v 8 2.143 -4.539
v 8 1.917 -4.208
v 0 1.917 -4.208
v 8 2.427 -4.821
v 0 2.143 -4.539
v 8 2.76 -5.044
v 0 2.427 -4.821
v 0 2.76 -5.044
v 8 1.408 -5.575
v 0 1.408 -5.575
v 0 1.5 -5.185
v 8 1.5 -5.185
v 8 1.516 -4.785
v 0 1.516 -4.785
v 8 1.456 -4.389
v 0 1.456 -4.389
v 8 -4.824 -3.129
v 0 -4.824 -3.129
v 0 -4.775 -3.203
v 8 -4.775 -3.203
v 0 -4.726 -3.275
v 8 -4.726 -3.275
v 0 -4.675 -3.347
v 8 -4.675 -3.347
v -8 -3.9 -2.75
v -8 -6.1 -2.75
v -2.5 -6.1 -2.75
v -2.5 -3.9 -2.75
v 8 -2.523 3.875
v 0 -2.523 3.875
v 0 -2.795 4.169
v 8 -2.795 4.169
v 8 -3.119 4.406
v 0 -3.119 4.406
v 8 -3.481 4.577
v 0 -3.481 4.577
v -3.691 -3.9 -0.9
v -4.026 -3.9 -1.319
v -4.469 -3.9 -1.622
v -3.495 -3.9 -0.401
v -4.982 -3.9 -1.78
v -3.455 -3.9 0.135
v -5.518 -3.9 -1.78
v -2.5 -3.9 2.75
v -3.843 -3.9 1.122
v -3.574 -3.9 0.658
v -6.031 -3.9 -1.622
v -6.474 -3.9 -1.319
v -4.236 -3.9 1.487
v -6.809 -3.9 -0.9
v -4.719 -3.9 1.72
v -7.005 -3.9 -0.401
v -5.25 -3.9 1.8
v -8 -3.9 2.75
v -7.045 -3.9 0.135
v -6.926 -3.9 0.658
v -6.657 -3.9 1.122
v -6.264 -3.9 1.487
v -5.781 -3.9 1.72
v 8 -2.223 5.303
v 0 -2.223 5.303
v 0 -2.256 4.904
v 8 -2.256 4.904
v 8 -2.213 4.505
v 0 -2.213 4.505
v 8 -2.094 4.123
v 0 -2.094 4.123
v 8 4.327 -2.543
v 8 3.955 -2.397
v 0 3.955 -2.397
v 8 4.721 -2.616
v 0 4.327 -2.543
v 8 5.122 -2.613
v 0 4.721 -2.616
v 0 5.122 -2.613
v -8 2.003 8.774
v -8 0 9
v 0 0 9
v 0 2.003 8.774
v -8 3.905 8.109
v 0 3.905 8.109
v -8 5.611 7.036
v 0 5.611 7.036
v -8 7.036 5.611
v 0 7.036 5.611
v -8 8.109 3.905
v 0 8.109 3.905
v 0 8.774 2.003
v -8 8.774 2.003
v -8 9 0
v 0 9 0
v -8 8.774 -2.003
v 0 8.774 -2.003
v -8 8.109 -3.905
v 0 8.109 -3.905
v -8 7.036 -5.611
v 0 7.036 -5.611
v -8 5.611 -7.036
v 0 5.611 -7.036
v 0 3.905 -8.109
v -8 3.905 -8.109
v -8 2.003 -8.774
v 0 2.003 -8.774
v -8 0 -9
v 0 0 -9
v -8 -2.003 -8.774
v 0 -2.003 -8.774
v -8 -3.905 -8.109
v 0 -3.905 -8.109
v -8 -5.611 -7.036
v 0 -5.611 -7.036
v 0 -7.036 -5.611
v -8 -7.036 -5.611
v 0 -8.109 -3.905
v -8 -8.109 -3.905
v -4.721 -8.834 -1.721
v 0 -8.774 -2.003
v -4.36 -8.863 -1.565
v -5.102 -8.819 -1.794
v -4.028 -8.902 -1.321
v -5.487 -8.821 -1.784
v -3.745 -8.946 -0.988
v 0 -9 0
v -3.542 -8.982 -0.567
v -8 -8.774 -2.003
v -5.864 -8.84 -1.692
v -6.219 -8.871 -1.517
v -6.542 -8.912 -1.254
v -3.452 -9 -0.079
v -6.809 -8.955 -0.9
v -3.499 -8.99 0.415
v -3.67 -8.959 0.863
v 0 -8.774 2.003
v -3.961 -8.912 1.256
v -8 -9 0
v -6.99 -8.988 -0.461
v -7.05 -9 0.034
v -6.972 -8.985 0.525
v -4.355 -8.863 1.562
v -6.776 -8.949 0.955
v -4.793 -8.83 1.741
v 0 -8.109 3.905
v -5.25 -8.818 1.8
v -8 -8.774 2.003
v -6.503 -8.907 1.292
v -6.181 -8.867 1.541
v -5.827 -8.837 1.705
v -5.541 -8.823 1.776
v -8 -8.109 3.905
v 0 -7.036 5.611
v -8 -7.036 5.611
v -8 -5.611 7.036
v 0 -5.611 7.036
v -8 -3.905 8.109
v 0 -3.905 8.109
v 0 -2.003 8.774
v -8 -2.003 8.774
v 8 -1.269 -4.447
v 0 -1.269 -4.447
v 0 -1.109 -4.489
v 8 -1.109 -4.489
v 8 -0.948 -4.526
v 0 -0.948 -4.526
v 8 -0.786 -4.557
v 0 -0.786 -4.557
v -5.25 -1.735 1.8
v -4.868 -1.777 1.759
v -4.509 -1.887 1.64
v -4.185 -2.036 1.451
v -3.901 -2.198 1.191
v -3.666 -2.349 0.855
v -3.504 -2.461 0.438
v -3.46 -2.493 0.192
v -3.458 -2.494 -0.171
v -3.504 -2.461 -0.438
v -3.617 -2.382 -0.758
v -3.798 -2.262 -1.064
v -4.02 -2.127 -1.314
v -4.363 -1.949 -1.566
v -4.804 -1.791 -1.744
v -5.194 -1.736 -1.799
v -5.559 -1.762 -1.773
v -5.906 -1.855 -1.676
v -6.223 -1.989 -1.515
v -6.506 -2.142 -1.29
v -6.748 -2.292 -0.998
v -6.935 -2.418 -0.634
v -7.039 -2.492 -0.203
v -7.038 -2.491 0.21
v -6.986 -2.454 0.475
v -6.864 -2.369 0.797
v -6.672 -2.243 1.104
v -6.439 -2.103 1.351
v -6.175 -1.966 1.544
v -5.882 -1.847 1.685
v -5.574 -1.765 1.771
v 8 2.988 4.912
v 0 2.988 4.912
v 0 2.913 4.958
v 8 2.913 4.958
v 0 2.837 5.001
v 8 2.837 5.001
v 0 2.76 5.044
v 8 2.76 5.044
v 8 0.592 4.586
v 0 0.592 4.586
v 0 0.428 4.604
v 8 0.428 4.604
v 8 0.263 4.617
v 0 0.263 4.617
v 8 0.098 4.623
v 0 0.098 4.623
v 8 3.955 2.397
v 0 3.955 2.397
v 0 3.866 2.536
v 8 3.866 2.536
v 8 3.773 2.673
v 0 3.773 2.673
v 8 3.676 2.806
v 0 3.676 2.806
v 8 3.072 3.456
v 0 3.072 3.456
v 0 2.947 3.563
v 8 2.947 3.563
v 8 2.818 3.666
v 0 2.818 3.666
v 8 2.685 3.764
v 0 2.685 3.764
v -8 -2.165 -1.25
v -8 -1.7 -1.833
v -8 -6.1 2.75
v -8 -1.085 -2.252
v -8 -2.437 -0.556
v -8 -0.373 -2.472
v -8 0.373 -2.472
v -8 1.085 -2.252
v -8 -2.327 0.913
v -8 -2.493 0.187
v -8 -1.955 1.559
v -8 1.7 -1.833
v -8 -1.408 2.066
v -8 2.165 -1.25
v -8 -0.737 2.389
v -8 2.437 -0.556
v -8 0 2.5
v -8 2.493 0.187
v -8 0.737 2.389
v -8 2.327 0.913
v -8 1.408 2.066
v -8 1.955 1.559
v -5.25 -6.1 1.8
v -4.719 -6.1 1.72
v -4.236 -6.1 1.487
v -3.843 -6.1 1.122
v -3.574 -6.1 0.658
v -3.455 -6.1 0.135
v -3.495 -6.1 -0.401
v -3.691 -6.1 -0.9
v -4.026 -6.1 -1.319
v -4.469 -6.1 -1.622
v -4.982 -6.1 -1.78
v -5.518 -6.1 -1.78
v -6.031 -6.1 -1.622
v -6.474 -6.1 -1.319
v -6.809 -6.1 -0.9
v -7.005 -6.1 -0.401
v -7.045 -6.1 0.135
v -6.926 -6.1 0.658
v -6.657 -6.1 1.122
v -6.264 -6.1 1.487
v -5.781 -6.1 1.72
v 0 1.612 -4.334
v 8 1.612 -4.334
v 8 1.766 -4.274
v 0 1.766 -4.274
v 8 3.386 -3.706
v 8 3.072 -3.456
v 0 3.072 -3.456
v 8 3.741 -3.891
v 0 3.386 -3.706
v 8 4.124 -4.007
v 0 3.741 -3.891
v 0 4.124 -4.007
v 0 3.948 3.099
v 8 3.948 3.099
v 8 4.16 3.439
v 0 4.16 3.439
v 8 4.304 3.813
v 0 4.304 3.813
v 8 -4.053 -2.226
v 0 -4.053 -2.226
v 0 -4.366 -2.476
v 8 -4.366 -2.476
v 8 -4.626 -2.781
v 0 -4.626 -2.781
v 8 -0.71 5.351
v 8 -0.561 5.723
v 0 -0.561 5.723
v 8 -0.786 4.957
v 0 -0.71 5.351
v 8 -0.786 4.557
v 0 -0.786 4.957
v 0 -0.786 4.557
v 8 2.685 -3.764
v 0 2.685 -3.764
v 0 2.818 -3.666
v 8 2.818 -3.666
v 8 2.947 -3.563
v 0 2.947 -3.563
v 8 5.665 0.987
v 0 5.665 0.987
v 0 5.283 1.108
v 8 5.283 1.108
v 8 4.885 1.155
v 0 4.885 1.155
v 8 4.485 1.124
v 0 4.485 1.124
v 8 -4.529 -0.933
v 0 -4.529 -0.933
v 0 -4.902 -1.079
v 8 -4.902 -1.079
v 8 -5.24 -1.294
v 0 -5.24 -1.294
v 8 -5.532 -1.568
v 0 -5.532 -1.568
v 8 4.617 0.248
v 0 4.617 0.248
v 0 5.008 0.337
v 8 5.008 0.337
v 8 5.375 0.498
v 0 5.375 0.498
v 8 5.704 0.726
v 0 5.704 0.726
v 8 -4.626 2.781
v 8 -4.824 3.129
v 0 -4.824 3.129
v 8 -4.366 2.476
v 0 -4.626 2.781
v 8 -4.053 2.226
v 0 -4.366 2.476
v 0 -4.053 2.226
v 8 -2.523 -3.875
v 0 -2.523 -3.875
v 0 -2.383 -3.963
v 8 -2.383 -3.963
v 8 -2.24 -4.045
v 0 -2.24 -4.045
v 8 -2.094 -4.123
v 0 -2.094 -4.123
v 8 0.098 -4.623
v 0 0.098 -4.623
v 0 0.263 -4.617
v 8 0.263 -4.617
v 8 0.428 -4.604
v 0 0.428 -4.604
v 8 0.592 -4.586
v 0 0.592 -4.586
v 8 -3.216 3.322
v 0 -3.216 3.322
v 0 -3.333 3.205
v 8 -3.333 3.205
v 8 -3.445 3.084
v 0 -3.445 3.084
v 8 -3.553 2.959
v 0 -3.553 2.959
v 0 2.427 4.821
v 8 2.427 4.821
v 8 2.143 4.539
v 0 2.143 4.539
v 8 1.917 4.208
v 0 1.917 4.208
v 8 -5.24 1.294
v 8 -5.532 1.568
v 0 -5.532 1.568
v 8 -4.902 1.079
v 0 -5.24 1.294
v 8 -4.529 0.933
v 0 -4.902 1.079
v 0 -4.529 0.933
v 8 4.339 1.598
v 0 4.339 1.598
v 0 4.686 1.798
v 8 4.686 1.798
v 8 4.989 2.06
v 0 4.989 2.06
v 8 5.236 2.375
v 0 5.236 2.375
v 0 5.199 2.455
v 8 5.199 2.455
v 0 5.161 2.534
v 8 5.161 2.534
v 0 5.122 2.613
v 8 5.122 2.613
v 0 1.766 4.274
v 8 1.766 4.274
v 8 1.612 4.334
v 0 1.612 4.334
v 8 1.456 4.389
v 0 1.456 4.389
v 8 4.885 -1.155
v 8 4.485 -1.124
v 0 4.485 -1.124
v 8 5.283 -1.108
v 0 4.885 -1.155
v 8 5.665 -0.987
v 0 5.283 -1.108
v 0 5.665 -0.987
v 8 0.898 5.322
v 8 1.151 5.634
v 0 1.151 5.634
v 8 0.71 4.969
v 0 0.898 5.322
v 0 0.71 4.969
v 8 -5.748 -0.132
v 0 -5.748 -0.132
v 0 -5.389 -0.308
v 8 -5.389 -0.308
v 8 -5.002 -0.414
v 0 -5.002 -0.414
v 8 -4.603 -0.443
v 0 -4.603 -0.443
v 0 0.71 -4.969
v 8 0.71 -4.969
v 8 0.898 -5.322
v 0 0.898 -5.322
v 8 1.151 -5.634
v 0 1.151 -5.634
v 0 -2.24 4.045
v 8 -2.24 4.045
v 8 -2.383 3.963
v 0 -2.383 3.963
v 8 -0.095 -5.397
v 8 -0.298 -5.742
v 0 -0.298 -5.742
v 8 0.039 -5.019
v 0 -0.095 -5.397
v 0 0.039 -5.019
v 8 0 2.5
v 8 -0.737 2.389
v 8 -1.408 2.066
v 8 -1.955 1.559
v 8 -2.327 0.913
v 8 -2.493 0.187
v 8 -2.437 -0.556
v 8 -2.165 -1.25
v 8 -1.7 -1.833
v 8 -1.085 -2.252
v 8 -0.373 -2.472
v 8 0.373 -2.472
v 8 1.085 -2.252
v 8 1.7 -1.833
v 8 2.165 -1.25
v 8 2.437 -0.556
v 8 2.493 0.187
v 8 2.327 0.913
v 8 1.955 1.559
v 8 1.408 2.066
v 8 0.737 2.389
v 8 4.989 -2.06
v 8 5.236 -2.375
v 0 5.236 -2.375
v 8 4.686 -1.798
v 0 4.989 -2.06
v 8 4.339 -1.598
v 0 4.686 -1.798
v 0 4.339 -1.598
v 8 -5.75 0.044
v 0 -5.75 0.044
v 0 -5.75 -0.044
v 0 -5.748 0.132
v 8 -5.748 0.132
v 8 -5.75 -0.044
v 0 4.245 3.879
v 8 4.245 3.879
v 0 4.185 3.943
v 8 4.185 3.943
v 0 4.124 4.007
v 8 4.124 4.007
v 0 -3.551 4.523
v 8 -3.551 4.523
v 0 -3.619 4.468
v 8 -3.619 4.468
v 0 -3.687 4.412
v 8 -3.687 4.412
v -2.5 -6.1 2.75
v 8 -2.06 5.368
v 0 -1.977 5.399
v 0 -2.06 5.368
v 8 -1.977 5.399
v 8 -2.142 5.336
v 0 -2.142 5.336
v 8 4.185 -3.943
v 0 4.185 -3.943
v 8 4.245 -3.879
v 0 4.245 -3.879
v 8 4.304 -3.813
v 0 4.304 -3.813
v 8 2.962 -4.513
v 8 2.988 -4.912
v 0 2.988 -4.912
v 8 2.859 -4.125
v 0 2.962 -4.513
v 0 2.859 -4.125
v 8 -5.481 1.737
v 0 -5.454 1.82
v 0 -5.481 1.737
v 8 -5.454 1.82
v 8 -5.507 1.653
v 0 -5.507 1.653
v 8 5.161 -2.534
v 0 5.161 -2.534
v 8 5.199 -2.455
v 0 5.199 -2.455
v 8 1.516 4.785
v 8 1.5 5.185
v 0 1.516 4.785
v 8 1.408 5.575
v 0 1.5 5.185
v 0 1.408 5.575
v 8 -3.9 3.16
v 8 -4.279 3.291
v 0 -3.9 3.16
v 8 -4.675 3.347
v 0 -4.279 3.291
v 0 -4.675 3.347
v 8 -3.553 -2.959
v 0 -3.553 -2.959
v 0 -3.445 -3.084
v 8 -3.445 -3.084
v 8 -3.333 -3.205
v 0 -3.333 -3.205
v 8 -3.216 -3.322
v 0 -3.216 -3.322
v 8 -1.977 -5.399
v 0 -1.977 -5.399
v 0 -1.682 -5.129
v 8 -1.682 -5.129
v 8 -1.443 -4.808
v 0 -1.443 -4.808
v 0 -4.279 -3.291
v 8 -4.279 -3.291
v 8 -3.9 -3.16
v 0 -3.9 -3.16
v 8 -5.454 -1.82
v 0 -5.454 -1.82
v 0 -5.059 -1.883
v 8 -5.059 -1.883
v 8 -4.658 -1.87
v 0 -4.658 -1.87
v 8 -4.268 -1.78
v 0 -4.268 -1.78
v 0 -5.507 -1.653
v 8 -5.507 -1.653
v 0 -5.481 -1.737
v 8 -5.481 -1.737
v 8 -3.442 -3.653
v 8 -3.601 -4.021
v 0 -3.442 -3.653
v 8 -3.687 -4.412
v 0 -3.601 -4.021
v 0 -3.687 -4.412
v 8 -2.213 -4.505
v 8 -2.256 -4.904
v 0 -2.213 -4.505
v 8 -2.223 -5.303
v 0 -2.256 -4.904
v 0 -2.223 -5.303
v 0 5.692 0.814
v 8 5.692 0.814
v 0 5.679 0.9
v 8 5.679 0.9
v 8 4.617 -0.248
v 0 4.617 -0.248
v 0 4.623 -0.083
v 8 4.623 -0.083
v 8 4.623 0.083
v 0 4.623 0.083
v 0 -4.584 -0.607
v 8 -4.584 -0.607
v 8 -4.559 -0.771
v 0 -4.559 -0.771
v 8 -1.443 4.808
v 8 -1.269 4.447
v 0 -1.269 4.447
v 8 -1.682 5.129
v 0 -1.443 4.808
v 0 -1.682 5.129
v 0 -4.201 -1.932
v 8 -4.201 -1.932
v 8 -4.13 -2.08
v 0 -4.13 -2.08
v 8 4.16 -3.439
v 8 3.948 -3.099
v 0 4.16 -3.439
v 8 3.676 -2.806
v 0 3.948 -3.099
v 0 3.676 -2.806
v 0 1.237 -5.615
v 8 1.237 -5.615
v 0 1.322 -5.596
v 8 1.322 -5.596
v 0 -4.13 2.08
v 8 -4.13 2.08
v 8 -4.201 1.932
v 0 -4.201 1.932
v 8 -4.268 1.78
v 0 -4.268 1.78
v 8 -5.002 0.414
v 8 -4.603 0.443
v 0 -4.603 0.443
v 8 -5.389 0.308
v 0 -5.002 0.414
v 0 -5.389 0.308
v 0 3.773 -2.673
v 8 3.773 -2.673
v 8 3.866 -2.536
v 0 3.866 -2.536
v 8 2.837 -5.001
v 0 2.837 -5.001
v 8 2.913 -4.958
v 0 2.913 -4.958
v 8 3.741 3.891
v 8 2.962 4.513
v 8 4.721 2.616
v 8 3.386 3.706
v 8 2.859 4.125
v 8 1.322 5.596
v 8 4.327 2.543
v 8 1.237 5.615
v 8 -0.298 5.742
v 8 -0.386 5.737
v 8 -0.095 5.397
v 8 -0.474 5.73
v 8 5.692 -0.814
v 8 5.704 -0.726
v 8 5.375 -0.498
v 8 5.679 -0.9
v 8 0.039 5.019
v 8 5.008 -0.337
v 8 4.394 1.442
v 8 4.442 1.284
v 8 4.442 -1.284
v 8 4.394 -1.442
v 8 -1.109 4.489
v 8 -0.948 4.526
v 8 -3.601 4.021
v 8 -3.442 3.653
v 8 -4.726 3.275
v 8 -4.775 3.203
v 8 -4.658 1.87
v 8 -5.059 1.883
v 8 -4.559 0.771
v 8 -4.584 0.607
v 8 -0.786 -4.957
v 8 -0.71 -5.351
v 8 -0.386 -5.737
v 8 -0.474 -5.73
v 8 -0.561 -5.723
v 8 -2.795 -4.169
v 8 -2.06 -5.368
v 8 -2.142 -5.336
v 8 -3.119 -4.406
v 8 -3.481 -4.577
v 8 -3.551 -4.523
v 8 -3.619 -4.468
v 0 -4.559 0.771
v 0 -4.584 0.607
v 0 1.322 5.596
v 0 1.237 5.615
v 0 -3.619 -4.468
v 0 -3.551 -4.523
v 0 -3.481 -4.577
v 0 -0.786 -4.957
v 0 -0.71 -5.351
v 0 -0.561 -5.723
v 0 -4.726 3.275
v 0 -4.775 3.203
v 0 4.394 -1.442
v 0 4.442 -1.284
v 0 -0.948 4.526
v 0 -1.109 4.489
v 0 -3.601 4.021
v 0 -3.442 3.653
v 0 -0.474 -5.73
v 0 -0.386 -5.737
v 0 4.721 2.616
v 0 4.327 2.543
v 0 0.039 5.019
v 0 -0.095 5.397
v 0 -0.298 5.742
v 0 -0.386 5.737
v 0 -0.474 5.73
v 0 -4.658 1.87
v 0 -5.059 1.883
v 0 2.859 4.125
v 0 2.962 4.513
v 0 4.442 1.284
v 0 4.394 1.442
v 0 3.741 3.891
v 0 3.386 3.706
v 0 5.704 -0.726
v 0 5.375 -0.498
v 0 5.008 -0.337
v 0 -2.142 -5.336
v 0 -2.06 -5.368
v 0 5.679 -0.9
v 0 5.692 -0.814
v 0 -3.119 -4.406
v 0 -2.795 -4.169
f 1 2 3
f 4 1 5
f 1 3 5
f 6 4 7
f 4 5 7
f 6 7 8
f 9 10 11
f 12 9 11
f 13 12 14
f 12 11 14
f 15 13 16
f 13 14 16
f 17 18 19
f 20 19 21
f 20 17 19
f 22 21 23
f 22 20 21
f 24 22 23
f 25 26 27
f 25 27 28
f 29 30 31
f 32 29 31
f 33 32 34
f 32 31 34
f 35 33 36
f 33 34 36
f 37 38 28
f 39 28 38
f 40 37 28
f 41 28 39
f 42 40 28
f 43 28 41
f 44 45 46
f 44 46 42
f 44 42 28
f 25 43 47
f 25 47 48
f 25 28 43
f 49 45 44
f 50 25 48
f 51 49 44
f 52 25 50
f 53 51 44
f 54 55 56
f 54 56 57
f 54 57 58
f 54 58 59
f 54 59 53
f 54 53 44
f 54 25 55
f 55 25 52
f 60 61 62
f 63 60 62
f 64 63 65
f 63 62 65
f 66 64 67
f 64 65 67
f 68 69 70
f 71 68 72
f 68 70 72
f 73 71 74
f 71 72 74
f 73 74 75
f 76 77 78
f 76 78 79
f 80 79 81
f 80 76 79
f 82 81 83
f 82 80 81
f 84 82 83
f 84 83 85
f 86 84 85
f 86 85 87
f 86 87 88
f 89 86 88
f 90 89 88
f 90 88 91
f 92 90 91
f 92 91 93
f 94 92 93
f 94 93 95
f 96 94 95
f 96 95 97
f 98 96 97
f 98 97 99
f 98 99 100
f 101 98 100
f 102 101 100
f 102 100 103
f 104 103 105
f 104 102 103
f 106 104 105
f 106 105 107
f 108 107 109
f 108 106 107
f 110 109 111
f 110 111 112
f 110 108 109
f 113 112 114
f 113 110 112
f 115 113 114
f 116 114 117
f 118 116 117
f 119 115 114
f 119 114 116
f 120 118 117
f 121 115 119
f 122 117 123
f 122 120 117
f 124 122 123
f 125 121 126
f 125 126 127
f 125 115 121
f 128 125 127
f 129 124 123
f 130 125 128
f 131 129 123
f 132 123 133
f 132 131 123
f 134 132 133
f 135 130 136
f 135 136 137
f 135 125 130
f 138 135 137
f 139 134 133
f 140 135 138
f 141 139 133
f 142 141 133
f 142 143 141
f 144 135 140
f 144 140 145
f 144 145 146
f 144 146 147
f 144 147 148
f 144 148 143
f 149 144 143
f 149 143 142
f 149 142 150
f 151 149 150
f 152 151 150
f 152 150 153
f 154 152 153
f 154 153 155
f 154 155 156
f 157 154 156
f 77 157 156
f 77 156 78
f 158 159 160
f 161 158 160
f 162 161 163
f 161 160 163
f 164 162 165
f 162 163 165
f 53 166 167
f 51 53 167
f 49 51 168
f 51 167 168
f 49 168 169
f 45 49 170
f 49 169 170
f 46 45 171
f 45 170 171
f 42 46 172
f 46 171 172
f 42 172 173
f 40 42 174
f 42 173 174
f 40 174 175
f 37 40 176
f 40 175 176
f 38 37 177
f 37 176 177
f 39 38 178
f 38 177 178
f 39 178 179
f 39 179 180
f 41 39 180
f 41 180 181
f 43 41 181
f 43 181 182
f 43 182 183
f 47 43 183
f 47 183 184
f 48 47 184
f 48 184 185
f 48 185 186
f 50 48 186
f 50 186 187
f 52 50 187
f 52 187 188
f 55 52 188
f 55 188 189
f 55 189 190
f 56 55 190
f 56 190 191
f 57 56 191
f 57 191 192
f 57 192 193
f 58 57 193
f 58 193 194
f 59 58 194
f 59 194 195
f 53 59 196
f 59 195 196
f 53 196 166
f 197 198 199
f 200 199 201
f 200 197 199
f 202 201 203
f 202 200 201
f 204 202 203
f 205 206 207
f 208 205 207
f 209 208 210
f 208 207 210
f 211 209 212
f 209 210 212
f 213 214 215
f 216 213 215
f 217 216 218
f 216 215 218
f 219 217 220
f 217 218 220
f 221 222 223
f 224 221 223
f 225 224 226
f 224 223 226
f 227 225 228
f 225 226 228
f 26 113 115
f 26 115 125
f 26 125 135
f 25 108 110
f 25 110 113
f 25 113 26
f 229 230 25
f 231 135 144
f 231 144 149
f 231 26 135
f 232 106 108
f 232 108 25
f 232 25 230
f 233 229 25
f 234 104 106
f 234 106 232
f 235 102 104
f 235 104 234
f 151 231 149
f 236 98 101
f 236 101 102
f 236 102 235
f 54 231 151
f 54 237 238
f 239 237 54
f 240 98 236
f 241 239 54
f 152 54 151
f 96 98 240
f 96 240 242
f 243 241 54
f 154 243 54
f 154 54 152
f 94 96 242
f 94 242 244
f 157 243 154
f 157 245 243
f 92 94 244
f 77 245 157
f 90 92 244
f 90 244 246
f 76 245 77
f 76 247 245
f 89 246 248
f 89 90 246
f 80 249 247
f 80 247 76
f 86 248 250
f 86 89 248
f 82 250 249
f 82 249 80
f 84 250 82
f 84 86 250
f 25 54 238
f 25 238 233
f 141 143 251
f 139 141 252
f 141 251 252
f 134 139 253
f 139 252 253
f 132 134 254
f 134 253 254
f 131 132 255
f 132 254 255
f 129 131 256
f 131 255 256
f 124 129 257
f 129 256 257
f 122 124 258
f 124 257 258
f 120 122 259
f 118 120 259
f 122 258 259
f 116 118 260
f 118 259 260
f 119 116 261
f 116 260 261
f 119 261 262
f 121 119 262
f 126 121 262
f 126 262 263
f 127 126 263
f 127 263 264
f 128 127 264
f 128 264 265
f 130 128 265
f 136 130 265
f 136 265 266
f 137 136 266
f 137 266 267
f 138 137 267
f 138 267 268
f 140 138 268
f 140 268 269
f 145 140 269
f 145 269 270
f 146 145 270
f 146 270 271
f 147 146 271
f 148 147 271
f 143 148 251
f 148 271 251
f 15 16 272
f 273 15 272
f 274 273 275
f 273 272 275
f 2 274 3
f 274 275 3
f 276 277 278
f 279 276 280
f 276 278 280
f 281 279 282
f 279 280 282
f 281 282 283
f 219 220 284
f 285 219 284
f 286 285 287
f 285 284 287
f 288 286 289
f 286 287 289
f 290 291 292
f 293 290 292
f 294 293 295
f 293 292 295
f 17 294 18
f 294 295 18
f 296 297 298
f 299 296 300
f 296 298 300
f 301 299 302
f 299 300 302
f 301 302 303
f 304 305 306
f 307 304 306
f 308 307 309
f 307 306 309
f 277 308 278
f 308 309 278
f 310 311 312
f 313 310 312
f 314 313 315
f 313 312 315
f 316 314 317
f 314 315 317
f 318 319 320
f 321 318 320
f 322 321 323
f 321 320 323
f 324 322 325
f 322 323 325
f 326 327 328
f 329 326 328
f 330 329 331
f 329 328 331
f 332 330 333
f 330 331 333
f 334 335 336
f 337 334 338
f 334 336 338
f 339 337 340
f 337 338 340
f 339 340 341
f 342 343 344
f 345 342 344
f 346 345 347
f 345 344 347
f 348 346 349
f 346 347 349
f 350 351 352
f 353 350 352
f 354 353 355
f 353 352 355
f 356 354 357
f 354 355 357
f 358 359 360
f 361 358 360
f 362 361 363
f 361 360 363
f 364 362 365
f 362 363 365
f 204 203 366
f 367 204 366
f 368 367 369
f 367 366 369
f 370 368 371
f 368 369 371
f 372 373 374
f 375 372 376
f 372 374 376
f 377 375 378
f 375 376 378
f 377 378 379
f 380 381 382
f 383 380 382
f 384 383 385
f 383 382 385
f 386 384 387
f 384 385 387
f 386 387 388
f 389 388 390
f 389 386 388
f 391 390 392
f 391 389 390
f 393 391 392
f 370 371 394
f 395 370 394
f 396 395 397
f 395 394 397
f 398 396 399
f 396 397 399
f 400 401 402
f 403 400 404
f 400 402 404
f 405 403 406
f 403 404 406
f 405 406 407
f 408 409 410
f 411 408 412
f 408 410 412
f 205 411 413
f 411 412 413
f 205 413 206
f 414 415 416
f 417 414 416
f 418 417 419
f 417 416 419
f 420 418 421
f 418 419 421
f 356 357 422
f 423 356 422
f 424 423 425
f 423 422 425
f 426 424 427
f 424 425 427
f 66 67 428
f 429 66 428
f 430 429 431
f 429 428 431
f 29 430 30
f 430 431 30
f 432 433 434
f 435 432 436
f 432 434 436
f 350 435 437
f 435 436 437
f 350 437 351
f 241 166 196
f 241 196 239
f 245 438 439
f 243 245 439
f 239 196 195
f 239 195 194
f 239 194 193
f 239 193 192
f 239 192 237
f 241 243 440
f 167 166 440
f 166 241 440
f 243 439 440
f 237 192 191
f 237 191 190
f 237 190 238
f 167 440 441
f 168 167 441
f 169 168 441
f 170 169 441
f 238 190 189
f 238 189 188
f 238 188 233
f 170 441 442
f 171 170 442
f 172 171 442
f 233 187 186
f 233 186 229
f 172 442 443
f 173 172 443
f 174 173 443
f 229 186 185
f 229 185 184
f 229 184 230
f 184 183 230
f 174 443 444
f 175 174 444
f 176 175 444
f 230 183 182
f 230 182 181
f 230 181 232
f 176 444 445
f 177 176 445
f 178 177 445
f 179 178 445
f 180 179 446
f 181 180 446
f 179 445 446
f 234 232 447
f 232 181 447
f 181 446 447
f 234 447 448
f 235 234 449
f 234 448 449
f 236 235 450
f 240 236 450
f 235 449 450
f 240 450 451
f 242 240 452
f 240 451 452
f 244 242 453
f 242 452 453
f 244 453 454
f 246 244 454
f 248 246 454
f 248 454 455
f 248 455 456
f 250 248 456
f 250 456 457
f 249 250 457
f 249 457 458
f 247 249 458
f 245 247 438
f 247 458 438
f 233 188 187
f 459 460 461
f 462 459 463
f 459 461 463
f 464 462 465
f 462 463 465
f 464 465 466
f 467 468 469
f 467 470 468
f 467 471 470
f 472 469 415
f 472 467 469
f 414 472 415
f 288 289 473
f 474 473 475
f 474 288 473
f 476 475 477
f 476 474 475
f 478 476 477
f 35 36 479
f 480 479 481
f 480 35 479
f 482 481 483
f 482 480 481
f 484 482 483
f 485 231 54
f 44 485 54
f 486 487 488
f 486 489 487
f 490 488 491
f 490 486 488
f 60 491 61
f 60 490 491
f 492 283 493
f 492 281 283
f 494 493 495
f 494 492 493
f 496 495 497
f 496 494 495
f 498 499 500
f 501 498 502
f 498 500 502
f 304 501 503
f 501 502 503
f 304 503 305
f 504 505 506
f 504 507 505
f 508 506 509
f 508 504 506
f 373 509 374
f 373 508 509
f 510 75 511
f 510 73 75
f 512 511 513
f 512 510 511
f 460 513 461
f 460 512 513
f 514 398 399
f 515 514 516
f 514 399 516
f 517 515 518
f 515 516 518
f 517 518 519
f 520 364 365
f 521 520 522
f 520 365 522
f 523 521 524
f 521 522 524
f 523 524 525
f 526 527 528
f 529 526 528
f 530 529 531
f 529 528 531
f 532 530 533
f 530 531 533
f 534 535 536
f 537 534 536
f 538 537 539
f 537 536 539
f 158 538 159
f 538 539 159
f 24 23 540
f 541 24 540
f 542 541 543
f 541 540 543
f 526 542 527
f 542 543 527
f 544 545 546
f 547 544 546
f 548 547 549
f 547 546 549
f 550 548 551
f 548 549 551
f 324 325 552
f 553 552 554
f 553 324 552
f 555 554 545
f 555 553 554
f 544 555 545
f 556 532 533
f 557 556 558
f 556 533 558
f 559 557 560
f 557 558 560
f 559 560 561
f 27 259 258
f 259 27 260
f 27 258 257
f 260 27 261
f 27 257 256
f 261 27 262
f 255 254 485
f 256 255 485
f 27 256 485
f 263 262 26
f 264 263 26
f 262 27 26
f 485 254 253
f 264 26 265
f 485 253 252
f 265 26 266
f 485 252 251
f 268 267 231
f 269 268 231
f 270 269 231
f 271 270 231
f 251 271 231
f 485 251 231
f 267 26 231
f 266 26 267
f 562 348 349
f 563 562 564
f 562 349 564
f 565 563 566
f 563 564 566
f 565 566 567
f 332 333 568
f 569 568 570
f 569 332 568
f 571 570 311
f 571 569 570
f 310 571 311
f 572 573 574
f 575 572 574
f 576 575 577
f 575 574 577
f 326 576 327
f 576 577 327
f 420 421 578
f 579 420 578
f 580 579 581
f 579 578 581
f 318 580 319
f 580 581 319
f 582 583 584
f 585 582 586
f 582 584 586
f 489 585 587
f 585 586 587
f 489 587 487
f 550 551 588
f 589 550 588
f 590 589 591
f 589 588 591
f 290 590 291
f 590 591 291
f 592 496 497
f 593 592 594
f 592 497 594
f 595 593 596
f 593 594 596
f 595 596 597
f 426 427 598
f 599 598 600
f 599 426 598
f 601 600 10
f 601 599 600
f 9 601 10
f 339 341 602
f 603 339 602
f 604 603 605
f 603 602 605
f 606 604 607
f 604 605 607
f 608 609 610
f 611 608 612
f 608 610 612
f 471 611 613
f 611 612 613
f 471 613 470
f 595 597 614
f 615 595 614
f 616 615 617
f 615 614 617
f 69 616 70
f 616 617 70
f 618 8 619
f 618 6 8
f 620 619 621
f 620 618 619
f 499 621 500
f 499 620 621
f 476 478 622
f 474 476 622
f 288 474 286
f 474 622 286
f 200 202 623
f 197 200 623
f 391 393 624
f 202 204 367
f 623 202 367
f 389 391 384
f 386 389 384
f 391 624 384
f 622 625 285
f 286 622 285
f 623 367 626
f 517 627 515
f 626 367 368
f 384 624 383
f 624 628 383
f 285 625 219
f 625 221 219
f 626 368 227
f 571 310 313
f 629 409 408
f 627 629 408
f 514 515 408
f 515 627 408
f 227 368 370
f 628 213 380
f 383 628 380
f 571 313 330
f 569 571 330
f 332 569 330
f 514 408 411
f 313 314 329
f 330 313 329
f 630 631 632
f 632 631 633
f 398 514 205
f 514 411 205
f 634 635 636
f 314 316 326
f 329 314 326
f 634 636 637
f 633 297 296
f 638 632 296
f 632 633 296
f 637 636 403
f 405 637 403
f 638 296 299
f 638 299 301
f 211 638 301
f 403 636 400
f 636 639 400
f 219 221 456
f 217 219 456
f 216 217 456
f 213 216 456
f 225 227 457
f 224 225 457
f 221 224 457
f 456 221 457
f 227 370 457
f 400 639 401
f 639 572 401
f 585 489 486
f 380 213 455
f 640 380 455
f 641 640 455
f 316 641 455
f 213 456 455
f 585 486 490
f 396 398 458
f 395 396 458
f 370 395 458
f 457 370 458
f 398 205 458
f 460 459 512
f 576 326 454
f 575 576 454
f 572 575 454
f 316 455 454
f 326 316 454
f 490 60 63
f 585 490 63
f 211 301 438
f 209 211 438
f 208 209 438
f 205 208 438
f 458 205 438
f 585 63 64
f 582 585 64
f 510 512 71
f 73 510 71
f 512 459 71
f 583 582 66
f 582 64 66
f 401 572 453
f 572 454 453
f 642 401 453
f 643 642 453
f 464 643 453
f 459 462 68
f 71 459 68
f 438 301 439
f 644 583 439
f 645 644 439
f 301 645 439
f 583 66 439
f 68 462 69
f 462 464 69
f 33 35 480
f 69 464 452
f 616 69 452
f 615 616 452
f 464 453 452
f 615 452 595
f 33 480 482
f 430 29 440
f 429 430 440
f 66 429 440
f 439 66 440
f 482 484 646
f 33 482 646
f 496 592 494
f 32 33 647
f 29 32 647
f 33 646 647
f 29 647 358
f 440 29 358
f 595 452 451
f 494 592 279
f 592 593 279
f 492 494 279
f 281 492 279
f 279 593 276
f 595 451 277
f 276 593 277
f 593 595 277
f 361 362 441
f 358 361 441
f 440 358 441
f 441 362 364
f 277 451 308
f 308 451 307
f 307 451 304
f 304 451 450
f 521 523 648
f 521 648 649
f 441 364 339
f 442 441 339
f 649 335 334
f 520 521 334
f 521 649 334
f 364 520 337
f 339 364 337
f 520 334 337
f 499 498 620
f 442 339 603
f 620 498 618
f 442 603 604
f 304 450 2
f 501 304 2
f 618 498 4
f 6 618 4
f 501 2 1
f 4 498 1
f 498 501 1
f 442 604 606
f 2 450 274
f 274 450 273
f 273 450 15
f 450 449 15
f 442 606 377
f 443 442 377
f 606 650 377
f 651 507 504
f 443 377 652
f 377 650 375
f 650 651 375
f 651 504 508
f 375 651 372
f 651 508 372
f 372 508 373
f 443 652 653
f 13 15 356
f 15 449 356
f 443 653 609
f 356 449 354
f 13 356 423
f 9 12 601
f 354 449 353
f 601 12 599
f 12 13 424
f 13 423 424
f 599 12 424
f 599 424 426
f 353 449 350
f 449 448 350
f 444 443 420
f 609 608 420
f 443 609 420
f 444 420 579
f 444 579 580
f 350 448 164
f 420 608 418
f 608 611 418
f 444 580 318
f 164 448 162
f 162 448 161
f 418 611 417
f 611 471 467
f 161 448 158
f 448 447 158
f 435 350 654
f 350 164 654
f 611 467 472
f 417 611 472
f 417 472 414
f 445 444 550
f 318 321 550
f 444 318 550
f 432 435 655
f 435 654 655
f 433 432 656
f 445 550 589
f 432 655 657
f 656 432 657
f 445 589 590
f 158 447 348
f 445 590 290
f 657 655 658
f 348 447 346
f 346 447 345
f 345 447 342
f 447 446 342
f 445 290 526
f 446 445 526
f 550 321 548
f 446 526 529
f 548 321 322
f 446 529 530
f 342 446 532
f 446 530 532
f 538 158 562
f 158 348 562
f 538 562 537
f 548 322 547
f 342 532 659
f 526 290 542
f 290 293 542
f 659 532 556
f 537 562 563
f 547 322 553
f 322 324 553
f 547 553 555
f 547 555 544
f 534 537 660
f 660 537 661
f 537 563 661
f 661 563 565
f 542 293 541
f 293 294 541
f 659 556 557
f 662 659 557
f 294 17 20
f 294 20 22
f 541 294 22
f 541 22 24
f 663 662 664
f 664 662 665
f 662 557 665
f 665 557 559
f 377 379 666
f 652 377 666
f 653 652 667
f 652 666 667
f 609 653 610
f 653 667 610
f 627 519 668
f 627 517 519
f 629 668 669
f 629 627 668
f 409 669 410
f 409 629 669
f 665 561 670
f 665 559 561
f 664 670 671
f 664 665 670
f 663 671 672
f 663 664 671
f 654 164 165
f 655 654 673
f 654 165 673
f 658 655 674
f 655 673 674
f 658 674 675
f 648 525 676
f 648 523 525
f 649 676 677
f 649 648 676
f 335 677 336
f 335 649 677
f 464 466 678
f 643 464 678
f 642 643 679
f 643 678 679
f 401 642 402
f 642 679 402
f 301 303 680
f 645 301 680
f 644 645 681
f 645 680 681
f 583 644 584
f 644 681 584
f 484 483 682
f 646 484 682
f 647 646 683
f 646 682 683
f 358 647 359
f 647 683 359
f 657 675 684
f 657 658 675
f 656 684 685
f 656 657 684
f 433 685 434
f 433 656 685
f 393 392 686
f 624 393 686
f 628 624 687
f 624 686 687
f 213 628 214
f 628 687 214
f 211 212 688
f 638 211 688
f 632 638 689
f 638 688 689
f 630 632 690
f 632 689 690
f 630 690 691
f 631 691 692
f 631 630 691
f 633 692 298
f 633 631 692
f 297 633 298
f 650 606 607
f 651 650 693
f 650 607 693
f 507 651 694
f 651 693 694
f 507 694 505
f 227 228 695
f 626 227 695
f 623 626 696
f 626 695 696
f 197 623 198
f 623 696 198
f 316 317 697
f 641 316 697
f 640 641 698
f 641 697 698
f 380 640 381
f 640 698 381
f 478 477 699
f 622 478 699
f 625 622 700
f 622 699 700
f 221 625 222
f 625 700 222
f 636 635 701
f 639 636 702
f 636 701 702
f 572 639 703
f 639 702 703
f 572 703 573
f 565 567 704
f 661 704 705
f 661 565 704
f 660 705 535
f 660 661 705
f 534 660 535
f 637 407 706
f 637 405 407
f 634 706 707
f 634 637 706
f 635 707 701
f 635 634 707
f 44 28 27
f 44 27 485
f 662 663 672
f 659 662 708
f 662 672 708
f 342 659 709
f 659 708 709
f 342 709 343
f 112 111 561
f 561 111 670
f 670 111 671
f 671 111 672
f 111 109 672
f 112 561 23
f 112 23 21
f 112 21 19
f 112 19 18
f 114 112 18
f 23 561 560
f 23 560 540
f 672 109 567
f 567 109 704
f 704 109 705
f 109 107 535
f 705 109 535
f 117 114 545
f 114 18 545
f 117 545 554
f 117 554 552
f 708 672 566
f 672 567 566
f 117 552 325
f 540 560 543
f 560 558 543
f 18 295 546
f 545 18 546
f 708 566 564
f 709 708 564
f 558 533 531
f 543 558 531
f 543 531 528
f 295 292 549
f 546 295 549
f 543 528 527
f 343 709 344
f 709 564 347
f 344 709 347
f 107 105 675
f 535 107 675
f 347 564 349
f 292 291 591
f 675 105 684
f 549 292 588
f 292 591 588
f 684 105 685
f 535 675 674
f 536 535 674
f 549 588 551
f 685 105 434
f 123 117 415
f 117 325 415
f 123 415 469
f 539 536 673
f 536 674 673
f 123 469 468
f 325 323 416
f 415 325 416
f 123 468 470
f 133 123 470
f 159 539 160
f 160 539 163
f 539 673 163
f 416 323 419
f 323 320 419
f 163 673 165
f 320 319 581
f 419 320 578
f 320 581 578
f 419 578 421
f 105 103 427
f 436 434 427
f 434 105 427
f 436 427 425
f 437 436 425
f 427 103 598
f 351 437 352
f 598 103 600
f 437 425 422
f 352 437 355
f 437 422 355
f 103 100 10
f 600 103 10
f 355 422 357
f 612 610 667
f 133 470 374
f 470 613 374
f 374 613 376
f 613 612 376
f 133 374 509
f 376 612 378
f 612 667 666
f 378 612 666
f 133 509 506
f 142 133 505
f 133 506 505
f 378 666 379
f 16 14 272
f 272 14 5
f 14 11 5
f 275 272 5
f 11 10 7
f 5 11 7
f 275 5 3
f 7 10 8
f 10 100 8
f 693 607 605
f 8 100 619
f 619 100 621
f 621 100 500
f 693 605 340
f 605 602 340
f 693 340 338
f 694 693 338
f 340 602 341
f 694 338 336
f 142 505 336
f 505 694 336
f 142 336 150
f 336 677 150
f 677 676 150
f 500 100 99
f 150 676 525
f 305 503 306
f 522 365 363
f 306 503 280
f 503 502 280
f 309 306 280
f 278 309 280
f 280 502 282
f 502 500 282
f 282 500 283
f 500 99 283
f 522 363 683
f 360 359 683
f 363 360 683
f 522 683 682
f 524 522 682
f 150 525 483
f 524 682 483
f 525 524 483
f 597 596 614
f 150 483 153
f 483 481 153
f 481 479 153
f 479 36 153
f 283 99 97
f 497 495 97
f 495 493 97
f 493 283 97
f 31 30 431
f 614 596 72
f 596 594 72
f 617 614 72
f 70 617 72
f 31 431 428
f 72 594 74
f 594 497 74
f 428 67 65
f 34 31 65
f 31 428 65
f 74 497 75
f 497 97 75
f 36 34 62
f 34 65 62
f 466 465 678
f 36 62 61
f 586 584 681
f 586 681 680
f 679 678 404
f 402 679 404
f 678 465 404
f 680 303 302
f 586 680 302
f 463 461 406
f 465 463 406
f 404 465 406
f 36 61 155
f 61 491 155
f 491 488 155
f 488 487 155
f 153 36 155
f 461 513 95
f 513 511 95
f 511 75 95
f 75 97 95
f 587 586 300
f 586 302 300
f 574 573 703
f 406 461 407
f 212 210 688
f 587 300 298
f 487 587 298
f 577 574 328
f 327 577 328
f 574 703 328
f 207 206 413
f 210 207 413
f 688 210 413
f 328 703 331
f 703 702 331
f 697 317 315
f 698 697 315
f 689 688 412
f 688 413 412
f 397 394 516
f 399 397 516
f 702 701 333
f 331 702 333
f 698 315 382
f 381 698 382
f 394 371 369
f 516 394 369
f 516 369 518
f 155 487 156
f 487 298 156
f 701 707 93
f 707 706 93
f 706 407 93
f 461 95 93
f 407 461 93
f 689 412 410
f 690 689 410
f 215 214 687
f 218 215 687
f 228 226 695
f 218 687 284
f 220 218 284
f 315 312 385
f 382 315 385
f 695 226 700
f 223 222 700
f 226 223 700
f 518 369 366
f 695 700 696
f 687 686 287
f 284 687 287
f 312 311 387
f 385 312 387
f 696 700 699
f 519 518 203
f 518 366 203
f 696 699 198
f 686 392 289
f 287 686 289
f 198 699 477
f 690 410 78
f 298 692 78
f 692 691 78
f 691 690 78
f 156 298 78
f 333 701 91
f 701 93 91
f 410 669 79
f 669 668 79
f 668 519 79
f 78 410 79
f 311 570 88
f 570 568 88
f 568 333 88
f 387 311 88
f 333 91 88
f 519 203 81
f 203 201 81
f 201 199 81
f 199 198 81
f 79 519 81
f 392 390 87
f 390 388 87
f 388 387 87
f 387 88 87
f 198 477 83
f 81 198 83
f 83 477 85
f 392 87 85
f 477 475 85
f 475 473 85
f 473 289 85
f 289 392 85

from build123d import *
from build123d.topology import SkipClean

# Parameters (mm, degrees)
BASPROSKE_W         = 8
BASPROSKE_H         = 5.75
TOOTHCUT_DEPTH      = 12.407234547
TEETHCUTS_COUNT     = 21
TEETHCUTS_ANGLE     = 342.857142857
HUBNEARONE_START    = 8.0000508
HUBNEAONESKE_R      = 4.624
HUBNEARONE_DEPTH    = 8.0000508
BORSKE_R            = 2.5
BORE_DEPTH          = 16.0000508
SKETCH1_R           = 9
SKETCH1_R_2         = 4.624
BOSS_EXTRUDE1_DEPTH = 8.0000508
SKETCH3_R           = 1.8
CUT_EXTRUDE1_DEPTH  = 16.033323412
SKETCH4_W           = 5.5
SKETCH4_H           = 2.2
CUT_EXTRUDE2_DEPTH  = 5.5


with BuildPart() as part:
    # BasProSke → Base-Revolve (revolve)
    with BuildSketch(Plane(origin=(0, 0, 0), x_dir=(1, 0, 0), z_dir=(0, 1, 0)), mode=Mode.PRIVATE) as base_revolve_sk:
        with Locations((4, 2.875)):
            Rectangle(BASPROSKE_W, BASPROSKE_H)
    revolve(base_revolve_sk.sketch.rotate(Axis((-10, 0, 0), (1, 0, 0)), 180), axis=Axis((-10, 0, 0), (1, 0, 0)))

    # TooCutSke → ToothCut (cut, through all)
    with BuildSketch(Plane(origin=(0, 0, 0), x_dir=(0, 0, -1), z_dir=(1, 0, 0))):
        with BuildLine():
            ThreePointArc((0.247570178, 4.617367757), (0, 4.624), (-0.247570178, 4.617367757))
            ThreePointArc((-0.247570178, 4.617367757), (-0.414765128, 5.209076442), (-0.746177874, 5.726994302))
            ThreePointArc((-0.746177874, 5.726994302), (0, 5.7754), (0.746177874, 5.726994302))
            ThreePointArc((0.746177874, 5.726994302), (0.414765128, 5.209076442), (0.247570178, 4.617367757))
        make_face()
    toothcut = extrude(amount=TOOTHCUT_DEPTH, mode=Mode.SUBTRACT)

    # TeethCuts: ToothCut ×21 about axis
    teethcuts_axis = Axis((-10, 0, 0), (1, 0, 0))
    for i in range(1, TEETHCUTS_COUNT):
        add(toothcut.rotate(teethcuts_axis, i * TEETHCUTS_ANGLE / (TEETHCUTS_COUNT - 1)), mode=Mode.SUBTRACT)

    # HubNeaOneSke → HubNearOne (add)
    with SkipClean():  # the faces are left unmerged after this step: merging them gives an invalid solid
        with BuildSketch(Plane.ZY.offset(HUBNEARONE_START)):
            Circle(HUBNEAONESKE_R)
        extrude(amount=-HUBNEARONE_DEPTH)

    # BorSke → Bore (cut, symmetric)
    with SkipClean():  # the faces are left unmerged after this step: merging them gives an invalid solid
        with BuildSketch(Plane(origin=(0, 0, 0), x_dir=(0, 0, -1), z_dir=(1, 0, 0))):
            with Locations(Location((0, 0, 0), (0, 0, 180))):
                Circle(BORSKE_R)
        extrude(amount=BORE_DEPTH, both=True, mode=Mode.SUBTRACT)

    # Sketch1 → Boss-Extrude1 (add)
    with BuildSketch(Plane.ZY.offset(8.0000508)):
        Circle(SKETCH1_R)
        Circle(SKETCH1_R_2, mode=Mode.SUBTRACT)
    extrude(amount=-BOSS_EXTRUDE1_DEPTH)

    # Sketch3 → Cut-Extrude1 (cut, through all)
    with BuildSketch(Plane(origin=(0, 0, 0), x_dir=(1, 0, 0), z_dir=(0, 1, 0))):
        with Locations(Location((-5.2500508, 0, 0), (0, 0, 270))):
            Circle(SKETCH3_R)
    extrude(amount=-CUT_EXTRUDE1_DEPTH, mode=Mode.SUBTRACT)

    # Sketch4 → Cut-Extrude2 (cut)
    with BuildSketch(Plane.ZY.offset(8.0000508)):
        with Locations((0, -5)):
            Rectangle(SKETCH4_W, SKETCH4_H)
    extrude(amount=-CUT_EXTRUDE2_DEPTH, mode=Mode.SUBTRACT)


solid = part.part
